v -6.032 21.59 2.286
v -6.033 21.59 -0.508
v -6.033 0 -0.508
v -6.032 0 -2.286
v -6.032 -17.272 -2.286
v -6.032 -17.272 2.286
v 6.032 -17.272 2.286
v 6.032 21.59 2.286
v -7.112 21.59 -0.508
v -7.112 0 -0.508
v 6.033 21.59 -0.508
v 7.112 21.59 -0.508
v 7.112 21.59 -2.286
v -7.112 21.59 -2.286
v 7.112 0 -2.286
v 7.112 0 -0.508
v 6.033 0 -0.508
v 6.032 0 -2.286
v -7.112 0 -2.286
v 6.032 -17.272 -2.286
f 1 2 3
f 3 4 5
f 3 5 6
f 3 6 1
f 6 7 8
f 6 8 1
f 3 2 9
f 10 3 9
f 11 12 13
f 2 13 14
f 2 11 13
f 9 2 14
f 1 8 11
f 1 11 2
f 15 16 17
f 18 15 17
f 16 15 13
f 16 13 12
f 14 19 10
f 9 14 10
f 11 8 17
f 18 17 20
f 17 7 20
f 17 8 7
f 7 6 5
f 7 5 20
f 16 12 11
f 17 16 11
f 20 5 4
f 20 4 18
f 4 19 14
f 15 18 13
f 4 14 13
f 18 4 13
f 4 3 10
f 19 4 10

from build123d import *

# Parameters (mm, degrees)
F0_W     = 12.065
F0_H     = 4.572
F1_DEPTH = 17.272
F2_W     = 12.065
F2_H     = 2.794
F2_W_2   = 1.0795
F2_H_2   = 1.778
F3_DEPTH = 21.59


with BuildPart() as f1:
    # F0 (on Front) → F1 (new body)
    with BuildSketch(Plane.XZ):
        Rectangle(F0_W, F0_H)
    extrude(amount=F1_DEPTH)

    # F2 (on face) → F3 (join)
    with BuildSketch(Plane(origin=(0, 0, 0), x_dir=(-1, 0, 0), z_dir=(0, 1, 0))):
        with Locations((0, 0.889)):
            Rectangle(F2_W, F2_H)
        with Locations((6.57225, -1.397)):
            Rectangle(F2_W_2, F2_H_2)
        with Locations((0, -1.397)):
            Rectangle(F2_W, F2_H_2)
        with Locations((-6.57225, -1.397)):
            Rectangle(F2_W_2, F2_H_2)
    extrude(amount=F3_DEPTH)


solid = f1.part
